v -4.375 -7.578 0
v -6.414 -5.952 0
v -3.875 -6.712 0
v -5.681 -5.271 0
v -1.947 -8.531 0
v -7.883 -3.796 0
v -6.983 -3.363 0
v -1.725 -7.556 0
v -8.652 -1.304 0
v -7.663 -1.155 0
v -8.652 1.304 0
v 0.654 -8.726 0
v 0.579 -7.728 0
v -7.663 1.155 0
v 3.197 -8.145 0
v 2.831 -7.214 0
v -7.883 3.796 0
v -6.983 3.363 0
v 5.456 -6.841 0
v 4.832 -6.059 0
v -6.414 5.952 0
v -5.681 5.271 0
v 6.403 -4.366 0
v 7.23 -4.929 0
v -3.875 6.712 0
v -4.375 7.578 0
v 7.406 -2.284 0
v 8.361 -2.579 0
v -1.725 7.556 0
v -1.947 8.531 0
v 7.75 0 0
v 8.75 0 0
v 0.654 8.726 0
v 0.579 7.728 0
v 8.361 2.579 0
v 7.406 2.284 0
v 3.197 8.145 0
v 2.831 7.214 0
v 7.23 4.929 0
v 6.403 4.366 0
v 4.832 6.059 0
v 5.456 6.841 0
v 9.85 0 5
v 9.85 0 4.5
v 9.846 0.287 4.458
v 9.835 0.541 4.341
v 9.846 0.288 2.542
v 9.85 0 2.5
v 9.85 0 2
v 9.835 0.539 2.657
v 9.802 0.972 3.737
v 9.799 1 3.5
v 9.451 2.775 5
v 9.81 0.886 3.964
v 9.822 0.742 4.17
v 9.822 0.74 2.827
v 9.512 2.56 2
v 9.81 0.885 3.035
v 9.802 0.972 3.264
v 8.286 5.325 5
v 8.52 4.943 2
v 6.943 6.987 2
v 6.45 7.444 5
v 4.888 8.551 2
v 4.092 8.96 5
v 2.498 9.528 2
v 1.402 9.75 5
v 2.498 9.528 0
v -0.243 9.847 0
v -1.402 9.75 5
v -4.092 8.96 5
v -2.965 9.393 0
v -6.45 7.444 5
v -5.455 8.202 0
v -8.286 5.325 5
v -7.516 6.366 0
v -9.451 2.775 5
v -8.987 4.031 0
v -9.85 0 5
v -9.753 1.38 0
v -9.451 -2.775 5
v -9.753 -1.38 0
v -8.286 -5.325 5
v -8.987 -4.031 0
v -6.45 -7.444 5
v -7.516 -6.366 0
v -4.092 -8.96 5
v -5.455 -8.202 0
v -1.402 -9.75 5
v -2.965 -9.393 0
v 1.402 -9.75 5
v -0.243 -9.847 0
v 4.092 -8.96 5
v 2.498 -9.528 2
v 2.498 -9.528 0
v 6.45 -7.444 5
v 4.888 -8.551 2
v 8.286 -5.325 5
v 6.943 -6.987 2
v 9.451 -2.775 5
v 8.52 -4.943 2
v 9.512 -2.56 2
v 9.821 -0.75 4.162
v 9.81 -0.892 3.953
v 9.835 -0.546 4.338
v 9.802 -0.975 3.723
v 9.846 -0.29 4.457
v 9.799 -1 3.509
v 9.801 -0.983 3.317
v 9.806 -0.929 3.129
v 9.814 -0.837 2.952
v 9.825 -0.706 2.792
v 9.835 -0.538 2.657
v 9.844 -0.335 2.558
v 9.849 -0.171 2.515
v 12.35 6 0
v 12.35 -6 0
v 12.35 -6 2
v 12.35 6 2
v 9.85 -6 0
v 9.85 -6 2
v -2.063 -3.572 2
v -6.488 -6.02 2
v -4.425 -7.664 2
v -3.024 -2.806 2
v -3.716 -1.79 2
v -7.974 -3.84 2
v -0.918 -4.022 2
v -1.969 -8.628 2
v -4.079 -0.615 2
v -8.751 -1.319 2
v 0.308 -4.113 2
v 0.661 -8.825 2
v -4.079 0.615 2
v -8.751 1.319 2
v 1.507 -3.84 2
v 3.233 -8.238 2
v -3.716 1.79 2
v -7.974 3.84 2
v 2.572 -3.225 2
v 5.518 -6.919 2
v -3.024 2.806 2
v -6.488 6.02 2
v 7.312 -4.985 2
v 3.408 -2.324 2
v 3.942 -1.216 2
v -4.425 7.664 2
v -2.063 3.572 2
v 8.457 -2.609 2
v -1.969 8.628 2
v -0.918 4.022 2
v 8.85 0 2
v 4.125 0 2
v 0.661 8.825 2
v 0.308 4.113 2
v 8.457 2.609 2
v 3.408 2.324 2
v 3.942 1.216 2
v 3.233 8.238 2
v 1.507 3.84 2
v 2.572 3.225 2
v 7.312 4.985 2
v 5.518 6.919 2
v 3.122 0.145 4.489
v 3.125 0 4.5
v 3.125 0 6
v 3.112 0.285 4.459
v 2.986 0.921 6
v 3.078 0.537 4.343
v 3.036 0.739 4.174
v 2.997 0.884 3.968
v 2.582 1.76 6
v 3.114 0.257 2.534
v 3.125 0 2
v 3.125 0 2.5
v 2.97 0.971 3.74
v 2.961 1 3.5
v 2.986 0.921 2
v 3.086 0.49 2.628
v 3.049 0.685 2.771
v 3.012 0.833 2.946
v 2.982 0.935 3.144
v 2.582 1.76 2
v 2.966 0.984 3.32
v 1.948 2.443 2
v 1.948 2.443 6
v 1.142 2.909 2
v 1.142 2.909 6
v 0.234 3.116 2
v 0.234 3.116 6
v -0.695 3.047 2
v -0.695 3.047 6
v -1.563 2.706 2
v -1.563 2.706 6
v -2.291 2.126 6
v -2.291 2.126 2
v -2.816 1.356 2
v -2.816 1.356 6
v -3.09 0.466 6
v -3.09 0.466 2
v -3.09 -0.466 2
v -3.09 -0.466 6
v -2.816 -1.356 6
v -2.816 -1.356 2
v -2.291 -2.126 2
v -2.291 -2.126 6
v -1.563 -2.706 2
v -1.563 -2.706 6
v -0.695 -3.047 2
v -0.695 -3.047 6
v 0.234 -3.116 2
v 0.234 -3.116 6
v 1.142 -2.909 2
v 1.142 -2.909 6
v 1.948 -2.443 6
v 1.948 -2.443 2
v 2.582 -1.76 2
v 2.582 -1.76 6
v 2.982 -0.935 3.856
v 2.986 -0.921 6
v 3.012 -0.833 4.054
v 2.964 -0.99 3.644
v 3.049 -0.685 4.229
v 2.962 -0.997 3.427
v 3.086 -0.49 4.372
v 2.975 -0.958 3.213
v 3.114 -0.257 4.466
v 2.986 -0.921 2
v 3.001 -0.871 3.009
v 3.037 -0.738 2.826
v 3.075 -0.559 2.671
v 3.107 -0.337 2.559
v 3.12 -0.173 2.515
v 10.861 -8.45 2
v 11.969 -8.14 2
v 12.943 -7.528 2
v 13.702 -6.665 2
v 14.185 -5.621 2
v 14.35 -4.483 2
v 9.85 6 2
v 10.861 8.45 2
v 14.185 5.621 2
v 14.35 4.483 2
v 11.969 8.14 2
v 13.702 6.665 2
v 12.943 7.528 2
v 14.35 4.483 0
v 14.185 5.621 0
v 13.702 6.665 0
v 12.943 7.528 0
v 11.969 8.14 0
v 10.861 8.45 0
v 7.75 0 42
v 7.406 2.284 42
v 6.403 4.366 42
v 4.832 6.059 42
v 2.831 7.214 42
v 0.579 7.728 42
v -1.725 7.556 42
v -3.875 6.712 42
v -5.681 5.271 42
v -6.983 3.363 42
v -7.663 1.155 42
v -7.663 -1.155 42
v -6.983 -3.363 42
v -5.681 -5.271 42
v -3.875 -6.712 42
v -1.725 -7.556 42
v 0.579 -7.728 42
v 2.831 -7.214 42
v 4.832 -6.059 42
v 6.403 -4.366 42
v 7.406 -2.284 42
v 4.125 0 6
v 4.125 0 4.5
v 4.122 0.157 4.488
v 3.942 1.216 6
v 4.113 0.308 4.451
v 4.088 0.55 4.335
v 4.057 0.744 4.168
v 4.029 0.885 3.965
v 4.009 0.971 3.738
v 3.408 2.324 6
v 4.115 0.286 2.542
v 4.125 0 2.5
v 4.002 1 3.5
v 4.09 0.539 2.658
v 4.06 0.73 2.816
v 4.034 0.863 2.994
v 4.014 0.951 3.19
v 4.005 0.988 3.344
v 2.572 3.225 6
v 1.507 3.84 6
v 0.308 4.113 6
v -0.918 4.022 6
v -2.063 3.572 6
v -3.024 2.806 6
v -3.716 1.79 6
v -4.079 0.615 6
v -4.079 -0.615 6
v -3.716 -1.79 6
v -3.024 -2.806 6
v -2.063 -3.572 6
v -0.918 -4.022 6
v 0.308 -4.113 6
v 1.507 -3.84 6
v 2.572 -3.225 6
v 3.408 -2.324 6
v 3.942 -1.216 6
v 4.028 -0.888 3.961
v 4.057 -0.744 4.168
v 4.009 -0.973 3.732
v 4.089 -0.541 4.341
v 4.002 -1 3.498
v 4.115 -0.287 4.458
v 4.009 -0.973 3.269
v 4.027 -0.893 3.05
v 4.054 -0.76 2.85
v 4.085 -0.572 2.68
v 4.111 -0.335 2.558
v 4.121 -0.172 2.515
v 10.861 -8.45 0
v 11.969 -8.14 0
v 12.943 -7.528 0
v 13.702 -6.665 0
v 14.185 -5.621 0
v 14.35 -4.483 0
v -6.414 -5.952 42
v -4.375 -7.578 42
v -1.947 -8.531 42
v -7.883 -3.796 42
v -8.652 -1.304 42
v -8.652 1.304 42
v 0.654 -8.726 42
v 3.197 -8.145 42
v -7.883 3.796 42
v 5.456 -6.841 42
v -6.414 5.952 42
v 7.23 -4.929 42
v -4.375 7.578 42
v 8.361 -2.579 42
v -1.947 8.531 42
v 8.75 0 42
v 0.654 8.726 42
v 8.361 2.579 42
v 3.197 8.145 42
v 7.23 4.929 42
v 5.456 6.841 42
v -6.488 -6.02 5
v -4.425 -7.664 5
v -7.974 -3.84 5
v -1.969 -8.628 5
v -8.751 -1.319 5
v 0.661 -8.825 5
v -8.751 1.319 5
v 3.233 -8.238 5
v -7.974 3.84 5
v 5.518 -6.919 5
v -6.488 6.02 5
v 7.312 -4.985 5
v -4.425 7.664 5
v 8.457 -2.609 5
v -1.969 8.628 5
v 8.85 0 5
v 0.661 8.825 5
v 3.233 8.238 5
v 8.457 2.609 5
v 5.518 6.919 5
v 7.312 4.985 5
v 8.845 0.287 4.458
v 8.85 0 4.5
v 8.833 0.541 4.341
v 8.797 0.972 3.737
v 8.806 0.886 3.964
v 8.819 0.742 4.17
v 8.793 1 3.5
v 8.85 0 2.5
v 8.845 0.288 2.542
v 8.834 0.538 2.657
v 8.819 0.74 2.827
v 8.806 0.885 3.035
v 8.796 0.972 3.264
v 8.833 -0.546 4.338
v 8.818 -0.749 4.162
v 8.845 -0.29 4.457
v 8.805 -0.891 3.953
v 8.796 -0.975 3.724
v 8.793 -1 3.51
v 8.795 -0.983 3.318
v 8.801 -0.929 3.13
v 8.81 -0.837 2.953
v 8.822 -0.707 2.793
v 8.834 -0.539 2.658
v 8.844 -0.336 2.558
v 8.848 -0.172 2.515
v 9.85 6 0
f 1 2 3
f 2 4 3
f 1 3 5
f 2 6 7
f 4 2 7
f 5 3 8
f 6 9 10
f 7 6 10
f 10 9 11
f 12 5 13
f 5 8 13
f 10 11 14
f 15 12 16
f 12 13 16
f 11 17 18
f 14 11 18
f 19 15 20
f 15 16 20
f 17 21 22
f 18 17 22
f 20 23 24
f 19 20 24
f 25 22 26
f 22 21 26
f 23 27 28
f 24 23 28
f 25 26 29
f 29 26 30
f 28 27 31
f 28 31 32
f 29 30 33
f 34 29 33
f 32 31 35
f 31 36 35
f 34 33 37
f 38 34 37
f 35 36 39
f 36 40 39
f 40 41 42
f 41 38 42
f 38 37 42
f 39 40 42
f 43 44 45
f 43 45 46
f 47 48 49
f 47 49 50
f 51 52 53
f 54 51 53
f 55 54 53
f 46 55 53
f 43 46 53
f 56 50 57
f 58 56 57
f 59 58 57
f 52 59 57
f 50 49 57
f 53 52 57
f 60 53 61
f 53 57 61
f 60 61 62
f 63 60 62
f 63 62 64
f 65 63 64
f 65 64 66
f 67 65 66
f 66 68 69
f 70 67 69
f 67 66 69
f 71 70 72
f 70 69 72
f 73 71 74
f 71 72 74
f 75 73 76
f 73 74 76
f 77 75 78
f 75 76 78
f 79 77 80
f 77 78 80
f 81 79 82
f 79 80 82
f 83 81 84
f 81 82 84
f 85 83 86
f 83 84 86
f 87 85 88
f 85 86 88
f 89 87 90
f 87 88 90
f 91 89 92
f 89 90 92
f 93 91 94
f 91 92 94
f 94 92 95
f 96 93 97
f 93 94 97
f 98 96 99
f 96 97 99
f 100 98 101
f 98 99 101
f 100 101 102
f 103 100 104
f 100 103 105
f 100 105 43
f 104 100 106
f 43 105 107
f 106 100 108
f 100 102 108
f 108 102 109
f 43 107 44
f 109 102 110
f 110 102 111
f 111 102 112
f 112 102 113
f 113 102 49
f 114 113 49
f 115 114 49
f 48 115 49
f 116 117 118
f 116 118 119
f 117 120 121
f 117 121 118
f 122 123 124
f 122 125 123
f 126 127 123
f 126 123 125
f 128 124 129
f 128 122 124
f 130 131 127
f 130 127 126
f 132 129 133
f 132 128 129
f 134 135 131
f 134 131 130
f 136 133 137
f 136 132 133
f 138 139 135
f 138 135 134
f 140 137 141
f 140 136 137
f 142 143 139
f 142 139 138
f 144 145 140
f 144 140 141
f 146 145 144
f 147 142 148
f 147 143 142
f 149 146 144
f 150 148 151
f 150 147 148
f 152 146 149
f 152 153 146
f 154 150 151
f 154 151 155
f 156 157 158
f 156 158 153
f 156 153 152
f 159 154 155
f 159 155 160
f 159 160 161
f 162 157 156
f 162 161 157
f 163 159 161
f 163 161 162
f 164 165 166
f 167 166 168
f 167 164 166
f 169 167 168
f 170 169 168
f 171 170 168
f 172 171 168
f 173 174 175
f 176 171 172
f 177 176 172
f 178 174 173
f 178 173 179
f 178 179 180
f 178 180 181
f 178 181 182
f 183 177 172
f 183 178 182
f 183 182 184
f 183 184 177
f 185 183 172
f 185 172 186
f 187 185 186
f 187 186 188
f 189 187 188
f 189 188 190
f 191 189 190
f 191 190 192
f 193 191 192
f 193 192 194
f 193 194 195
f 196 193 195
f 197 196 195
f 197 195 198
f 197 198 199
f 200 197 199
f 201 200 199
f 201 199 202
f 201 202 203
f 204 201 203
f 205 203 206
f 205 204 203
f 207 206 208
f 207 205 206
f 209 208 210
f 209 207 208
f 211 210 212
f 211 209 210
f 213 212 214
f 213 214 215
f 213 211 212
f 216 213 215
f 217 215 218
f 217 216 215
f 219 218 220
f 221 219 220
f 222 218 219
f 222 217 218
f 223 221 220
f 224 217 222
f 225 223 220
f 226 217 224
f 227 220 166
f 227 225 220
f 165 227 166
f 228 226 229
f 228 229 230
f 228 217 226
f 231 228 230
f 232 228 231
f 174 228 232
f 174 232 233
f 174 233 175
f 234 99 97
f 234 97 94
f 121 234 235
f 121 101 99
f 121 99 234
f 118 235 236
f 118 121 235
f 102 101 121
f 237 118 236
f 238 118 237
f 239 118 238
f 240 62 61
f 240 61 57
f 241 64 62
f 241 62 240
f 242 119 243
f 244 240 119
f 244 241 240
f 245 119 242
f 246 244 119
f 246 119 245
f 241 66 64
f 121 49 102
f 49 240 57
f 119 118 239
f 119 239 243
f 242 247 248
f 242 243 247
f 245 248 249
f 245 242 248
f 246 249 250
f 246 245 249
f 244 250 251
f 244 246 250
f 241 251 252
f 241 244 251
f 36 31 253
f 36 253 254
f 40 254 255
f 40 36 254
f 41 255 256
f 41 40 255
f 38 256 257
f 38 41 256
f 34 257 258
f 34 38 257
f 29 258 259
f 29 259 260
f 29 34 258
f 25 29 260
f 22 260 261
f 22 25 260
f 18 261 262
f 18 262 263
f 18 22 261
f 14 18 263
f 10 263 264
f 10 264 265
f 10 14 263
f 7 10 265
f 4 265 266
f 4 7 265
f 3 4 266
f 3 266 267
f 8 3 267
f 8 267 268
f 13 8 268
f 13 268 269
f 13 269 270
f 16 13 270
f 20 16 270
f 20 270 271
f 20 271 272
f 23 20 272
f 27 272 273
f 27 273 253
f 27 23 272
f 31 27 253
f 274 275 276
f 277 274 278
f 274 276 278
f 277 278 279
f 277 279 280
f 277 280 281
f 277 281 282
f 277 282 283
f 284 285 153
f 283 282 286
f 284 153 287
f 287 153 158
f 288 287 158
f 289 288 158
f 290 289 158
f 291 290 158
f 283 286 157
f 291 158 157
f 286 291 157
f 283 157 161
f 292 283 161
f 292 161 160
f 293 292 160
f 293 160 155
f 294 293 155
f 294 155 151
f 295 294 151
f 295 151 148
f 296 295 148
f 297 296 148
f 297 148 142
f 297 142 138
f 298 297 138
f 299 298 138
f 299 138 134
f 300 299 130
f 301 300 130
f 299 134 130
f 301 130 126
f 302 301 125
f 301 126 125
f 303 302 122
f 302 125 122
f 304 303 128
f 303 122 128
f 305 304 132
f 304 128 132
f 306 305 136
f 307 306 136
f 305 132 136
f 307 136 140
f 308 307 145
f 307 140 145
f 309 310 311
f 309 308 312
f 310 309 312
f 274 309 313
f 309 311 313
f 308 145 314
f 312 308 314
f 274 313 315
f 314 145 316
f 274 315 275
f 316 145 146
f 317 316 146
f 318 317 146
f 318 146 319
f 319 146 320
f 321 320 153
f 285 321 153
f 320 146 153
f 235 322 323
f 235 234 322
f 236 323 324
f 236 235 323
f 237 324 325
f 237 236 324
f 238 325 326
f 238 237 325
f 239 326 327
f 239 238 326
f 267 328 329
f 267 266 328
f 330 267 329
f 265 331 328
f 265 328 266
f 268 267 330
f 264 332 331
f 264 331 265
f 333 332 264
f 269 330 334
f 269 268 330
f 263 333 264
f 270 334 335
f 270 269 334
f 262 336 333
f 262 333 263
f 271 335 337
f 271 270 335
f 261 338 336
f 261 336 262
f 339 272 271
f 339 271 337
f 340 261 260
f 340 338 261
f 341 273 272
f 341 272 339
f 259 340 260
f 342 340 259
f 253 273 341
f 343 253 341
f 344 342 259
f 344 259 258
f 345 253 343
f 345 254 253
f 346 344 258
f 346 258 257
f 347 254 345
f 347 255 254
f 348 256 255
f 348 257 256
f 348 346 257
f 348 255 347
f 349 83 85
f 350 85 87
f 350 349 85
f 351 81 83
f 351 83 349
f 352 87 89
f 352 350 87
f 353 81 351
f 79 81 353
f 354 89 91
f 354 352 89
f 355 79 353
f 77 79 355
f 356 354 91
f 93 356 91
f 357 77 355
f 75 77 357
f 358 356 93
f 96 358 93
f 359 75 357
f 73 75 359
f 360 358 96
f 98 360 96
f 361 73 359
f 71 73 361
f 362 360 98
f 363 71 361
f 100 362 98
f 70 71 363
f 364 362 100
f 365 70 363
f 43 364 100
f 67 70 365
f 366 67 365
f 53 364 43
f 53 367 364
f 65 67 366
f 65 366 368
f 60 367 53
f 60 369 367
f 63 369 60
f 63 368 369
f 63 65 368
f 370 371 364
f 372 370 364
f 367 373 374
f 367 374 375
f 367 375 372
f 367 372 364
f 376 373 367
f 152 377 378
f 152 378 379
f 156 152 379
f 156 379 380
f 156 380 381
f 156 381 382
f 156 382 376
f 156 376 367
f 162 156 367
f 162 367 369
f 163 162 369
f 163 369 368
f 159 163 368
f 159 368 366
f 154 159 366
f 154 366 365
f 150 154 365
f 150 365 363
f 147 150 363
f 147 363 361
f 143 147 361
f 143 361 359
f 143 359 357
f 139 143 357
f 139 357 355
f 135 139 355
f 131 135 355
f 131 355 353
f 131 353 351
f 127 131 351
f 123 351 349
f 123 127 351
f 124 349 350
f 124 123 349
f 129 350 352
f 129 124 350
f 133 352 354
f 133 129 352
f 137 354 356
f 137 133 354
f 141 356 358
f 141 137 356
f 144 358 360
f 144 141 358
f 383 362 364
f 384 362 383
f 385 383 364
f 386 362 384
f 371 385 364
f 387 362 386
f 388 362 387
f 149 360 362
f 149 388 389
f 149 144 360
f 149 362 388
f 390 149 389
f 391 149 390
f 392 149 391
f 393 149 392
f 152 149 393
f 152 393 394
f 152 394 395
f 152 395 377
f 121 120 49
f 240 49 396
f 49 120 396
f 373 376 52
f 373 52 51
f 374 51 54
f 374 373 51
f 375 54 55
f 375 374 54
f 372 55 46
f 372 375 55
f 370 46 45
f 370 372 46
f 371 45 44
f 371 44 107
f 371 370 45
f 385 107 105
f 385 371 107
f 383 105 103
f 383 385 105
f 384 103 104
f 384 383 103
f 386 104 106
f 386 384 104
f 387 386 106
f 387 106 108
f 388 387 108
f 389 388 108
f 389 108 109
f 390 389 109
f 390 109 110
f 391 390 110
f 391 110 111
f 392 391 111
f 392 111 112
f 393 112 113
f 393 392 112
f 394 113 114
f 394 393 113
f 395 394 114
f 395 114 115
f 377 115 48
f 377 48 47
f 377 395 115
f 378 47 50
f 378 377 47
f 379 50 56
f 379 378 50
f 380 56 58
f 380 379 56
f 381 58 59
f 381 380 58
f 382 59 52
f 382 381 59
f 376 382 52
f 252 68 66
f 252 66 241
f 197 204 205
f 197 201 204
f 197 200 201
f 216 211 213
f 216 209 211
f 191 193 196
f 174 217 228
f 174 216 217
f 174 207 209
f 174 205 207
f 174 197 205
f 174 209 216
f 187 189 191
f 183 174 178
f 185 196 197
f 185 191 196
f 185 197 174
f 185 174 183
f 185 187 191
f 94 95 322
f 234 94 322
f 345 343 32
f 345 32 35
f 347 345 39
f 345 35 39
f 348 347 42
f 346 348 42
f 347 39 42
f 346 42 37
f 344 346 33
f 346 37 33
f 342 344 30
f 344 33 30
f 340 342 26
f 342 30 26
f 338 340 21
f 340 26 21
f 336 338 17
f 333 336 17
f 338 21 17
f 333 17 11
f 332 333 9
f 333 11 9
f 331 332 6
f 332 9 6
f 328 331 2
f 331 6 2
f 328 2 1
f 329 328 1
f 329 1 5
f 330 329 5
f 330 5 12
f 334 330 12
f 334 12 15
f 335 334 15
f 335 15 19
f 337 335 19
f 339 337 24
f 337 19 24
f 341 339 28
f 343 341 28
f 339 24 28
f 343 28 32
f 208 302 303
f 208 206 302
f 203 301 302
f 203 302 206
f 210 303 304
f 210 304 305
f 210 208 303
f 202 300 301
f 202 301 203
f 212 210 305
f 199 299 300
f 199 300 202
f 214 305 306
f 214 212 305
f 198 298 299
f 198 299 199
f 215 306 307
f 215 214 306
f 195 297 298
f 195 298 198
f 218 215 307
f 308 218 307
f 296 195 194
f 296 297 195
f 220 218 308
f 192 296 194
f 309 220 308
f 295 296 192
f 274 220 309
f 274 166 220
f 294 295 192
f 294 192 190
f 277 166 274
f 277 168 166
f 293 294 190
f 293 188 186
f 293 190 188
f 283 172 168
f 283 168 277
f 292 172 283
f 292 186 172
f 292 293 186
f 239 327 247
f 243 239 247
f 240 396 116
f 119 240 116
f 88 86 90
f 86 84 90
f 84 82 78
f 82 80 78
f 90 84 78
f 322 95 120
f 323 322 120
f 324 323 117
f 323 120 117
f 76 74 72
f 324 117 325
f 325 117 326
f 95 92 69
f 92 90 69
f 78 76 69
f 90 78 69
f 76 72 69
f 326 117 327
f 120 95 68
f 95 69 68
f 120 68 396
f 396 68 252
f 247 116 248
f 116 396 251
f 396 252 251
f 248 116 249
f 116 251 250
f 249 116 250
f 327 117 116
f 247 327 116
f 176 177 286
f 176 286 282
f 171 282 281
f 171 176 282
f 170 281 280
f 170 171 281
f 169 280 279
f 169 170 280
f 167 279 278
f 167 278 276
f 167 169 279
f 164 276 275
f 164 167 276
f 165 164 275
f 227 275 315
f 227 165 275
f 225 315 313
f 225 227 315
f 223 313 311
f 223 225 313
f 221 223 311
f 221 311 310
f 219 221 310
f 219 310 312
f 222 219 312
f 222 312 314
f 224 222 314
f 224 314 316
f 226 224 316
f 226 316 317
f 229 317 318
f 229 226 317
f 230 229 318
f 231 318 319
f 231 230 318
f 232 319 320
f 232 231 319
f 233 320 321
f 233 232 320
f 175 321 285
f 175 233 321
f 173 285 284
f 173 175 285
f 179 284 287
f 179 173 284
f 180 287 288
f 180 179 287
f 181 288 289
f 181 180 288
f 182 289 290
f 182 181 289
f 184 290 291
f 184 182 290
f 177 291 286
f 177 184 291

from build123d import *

# Parameters (mm, degrees)
SKETCH_R      = 8.75
SKETCH_R_2    = 7.75
PAD_DEPTH     = 42
SKETCH001_R   = 9.85
SKETCH001_R_2 = 8.85
PAD001_DEPTH  = 5
SKETCH002_W   = 2.5
SKETCH002_H   = 12
PAD002_DEPTH  = 2
SKETCH003_R   = 4.125
SKETCH003_R_2 = 3.125
PAD003_DEPTH  = 6
FILLET_R      = 4
SKETCH004_R   = 1
POCKET_DEPTH  = 14.351


with BuildPart() as body:
    # Sketch → Pad (new body)
    with BuildSketch(Plane.XY):
        Circle(SKETCH_R)
        Circle(SKETCH_R_2, mode=Mode.SUBTRACT)
    extrude(amount=PAD_DEPTH)


with BuildPart() as body001:
    # Sketch001 → Pad001 (new body)
    with BuildSketch(Plane.XY):
        Circle(SKETCH001_R)
        Circle(SKETCH001_R_2, mode=Mode.SUBTRACT)
    extrude(amount=PAD001_DEPTH)

    # Sketch002 → Pad002 (join)
    with BuildSketch(Plane.XY):
        with BuildLine():
            Line((14.35, -8), (14.35, 8))
            Line((0, 9.85), (14.35, 8))
            ThreePointArc((0, 9.85), (-9.85, 0), (0, -9.85))
            Line((0, -9.85), (14.35, -8))
        make_face()
        with Locations((11.1, 0)):
            Rectangle(SKETCH002_W, SKETCH002_H, mode=Mode.SUBTRACT)
    extrude(amount=PAD002_DEPTH)

    # Sketch003 → Pad003 (join)
    with BuildSketch(Plane.XY):
        Circle(SKETCH003_R)
        Circle(SKETCH003_R_2, mode=Mode.SUBTRACT)
    extrude(amount=PAD003_DEPTH)

    # Fillet
    fillet_edges = [body001.edges().sort_by_distance(p)[0] for p in [
        (14.35, 8, 1),
        (14.35, -8, 1),
    ]]
    fillet(fillet_edges, radius=FILLET_R)

    # Sketch004 → Pocket (cut, through all)
    with BuildSketch(Plane.YZ):
        with Locations((0, 3.5)):
            Circle(SKETCH004_R)
    extrude(amount=POCKET_DEPTH, mode=Mode.SUBTRACT)


solid = Compound([body.part, body001.part])
